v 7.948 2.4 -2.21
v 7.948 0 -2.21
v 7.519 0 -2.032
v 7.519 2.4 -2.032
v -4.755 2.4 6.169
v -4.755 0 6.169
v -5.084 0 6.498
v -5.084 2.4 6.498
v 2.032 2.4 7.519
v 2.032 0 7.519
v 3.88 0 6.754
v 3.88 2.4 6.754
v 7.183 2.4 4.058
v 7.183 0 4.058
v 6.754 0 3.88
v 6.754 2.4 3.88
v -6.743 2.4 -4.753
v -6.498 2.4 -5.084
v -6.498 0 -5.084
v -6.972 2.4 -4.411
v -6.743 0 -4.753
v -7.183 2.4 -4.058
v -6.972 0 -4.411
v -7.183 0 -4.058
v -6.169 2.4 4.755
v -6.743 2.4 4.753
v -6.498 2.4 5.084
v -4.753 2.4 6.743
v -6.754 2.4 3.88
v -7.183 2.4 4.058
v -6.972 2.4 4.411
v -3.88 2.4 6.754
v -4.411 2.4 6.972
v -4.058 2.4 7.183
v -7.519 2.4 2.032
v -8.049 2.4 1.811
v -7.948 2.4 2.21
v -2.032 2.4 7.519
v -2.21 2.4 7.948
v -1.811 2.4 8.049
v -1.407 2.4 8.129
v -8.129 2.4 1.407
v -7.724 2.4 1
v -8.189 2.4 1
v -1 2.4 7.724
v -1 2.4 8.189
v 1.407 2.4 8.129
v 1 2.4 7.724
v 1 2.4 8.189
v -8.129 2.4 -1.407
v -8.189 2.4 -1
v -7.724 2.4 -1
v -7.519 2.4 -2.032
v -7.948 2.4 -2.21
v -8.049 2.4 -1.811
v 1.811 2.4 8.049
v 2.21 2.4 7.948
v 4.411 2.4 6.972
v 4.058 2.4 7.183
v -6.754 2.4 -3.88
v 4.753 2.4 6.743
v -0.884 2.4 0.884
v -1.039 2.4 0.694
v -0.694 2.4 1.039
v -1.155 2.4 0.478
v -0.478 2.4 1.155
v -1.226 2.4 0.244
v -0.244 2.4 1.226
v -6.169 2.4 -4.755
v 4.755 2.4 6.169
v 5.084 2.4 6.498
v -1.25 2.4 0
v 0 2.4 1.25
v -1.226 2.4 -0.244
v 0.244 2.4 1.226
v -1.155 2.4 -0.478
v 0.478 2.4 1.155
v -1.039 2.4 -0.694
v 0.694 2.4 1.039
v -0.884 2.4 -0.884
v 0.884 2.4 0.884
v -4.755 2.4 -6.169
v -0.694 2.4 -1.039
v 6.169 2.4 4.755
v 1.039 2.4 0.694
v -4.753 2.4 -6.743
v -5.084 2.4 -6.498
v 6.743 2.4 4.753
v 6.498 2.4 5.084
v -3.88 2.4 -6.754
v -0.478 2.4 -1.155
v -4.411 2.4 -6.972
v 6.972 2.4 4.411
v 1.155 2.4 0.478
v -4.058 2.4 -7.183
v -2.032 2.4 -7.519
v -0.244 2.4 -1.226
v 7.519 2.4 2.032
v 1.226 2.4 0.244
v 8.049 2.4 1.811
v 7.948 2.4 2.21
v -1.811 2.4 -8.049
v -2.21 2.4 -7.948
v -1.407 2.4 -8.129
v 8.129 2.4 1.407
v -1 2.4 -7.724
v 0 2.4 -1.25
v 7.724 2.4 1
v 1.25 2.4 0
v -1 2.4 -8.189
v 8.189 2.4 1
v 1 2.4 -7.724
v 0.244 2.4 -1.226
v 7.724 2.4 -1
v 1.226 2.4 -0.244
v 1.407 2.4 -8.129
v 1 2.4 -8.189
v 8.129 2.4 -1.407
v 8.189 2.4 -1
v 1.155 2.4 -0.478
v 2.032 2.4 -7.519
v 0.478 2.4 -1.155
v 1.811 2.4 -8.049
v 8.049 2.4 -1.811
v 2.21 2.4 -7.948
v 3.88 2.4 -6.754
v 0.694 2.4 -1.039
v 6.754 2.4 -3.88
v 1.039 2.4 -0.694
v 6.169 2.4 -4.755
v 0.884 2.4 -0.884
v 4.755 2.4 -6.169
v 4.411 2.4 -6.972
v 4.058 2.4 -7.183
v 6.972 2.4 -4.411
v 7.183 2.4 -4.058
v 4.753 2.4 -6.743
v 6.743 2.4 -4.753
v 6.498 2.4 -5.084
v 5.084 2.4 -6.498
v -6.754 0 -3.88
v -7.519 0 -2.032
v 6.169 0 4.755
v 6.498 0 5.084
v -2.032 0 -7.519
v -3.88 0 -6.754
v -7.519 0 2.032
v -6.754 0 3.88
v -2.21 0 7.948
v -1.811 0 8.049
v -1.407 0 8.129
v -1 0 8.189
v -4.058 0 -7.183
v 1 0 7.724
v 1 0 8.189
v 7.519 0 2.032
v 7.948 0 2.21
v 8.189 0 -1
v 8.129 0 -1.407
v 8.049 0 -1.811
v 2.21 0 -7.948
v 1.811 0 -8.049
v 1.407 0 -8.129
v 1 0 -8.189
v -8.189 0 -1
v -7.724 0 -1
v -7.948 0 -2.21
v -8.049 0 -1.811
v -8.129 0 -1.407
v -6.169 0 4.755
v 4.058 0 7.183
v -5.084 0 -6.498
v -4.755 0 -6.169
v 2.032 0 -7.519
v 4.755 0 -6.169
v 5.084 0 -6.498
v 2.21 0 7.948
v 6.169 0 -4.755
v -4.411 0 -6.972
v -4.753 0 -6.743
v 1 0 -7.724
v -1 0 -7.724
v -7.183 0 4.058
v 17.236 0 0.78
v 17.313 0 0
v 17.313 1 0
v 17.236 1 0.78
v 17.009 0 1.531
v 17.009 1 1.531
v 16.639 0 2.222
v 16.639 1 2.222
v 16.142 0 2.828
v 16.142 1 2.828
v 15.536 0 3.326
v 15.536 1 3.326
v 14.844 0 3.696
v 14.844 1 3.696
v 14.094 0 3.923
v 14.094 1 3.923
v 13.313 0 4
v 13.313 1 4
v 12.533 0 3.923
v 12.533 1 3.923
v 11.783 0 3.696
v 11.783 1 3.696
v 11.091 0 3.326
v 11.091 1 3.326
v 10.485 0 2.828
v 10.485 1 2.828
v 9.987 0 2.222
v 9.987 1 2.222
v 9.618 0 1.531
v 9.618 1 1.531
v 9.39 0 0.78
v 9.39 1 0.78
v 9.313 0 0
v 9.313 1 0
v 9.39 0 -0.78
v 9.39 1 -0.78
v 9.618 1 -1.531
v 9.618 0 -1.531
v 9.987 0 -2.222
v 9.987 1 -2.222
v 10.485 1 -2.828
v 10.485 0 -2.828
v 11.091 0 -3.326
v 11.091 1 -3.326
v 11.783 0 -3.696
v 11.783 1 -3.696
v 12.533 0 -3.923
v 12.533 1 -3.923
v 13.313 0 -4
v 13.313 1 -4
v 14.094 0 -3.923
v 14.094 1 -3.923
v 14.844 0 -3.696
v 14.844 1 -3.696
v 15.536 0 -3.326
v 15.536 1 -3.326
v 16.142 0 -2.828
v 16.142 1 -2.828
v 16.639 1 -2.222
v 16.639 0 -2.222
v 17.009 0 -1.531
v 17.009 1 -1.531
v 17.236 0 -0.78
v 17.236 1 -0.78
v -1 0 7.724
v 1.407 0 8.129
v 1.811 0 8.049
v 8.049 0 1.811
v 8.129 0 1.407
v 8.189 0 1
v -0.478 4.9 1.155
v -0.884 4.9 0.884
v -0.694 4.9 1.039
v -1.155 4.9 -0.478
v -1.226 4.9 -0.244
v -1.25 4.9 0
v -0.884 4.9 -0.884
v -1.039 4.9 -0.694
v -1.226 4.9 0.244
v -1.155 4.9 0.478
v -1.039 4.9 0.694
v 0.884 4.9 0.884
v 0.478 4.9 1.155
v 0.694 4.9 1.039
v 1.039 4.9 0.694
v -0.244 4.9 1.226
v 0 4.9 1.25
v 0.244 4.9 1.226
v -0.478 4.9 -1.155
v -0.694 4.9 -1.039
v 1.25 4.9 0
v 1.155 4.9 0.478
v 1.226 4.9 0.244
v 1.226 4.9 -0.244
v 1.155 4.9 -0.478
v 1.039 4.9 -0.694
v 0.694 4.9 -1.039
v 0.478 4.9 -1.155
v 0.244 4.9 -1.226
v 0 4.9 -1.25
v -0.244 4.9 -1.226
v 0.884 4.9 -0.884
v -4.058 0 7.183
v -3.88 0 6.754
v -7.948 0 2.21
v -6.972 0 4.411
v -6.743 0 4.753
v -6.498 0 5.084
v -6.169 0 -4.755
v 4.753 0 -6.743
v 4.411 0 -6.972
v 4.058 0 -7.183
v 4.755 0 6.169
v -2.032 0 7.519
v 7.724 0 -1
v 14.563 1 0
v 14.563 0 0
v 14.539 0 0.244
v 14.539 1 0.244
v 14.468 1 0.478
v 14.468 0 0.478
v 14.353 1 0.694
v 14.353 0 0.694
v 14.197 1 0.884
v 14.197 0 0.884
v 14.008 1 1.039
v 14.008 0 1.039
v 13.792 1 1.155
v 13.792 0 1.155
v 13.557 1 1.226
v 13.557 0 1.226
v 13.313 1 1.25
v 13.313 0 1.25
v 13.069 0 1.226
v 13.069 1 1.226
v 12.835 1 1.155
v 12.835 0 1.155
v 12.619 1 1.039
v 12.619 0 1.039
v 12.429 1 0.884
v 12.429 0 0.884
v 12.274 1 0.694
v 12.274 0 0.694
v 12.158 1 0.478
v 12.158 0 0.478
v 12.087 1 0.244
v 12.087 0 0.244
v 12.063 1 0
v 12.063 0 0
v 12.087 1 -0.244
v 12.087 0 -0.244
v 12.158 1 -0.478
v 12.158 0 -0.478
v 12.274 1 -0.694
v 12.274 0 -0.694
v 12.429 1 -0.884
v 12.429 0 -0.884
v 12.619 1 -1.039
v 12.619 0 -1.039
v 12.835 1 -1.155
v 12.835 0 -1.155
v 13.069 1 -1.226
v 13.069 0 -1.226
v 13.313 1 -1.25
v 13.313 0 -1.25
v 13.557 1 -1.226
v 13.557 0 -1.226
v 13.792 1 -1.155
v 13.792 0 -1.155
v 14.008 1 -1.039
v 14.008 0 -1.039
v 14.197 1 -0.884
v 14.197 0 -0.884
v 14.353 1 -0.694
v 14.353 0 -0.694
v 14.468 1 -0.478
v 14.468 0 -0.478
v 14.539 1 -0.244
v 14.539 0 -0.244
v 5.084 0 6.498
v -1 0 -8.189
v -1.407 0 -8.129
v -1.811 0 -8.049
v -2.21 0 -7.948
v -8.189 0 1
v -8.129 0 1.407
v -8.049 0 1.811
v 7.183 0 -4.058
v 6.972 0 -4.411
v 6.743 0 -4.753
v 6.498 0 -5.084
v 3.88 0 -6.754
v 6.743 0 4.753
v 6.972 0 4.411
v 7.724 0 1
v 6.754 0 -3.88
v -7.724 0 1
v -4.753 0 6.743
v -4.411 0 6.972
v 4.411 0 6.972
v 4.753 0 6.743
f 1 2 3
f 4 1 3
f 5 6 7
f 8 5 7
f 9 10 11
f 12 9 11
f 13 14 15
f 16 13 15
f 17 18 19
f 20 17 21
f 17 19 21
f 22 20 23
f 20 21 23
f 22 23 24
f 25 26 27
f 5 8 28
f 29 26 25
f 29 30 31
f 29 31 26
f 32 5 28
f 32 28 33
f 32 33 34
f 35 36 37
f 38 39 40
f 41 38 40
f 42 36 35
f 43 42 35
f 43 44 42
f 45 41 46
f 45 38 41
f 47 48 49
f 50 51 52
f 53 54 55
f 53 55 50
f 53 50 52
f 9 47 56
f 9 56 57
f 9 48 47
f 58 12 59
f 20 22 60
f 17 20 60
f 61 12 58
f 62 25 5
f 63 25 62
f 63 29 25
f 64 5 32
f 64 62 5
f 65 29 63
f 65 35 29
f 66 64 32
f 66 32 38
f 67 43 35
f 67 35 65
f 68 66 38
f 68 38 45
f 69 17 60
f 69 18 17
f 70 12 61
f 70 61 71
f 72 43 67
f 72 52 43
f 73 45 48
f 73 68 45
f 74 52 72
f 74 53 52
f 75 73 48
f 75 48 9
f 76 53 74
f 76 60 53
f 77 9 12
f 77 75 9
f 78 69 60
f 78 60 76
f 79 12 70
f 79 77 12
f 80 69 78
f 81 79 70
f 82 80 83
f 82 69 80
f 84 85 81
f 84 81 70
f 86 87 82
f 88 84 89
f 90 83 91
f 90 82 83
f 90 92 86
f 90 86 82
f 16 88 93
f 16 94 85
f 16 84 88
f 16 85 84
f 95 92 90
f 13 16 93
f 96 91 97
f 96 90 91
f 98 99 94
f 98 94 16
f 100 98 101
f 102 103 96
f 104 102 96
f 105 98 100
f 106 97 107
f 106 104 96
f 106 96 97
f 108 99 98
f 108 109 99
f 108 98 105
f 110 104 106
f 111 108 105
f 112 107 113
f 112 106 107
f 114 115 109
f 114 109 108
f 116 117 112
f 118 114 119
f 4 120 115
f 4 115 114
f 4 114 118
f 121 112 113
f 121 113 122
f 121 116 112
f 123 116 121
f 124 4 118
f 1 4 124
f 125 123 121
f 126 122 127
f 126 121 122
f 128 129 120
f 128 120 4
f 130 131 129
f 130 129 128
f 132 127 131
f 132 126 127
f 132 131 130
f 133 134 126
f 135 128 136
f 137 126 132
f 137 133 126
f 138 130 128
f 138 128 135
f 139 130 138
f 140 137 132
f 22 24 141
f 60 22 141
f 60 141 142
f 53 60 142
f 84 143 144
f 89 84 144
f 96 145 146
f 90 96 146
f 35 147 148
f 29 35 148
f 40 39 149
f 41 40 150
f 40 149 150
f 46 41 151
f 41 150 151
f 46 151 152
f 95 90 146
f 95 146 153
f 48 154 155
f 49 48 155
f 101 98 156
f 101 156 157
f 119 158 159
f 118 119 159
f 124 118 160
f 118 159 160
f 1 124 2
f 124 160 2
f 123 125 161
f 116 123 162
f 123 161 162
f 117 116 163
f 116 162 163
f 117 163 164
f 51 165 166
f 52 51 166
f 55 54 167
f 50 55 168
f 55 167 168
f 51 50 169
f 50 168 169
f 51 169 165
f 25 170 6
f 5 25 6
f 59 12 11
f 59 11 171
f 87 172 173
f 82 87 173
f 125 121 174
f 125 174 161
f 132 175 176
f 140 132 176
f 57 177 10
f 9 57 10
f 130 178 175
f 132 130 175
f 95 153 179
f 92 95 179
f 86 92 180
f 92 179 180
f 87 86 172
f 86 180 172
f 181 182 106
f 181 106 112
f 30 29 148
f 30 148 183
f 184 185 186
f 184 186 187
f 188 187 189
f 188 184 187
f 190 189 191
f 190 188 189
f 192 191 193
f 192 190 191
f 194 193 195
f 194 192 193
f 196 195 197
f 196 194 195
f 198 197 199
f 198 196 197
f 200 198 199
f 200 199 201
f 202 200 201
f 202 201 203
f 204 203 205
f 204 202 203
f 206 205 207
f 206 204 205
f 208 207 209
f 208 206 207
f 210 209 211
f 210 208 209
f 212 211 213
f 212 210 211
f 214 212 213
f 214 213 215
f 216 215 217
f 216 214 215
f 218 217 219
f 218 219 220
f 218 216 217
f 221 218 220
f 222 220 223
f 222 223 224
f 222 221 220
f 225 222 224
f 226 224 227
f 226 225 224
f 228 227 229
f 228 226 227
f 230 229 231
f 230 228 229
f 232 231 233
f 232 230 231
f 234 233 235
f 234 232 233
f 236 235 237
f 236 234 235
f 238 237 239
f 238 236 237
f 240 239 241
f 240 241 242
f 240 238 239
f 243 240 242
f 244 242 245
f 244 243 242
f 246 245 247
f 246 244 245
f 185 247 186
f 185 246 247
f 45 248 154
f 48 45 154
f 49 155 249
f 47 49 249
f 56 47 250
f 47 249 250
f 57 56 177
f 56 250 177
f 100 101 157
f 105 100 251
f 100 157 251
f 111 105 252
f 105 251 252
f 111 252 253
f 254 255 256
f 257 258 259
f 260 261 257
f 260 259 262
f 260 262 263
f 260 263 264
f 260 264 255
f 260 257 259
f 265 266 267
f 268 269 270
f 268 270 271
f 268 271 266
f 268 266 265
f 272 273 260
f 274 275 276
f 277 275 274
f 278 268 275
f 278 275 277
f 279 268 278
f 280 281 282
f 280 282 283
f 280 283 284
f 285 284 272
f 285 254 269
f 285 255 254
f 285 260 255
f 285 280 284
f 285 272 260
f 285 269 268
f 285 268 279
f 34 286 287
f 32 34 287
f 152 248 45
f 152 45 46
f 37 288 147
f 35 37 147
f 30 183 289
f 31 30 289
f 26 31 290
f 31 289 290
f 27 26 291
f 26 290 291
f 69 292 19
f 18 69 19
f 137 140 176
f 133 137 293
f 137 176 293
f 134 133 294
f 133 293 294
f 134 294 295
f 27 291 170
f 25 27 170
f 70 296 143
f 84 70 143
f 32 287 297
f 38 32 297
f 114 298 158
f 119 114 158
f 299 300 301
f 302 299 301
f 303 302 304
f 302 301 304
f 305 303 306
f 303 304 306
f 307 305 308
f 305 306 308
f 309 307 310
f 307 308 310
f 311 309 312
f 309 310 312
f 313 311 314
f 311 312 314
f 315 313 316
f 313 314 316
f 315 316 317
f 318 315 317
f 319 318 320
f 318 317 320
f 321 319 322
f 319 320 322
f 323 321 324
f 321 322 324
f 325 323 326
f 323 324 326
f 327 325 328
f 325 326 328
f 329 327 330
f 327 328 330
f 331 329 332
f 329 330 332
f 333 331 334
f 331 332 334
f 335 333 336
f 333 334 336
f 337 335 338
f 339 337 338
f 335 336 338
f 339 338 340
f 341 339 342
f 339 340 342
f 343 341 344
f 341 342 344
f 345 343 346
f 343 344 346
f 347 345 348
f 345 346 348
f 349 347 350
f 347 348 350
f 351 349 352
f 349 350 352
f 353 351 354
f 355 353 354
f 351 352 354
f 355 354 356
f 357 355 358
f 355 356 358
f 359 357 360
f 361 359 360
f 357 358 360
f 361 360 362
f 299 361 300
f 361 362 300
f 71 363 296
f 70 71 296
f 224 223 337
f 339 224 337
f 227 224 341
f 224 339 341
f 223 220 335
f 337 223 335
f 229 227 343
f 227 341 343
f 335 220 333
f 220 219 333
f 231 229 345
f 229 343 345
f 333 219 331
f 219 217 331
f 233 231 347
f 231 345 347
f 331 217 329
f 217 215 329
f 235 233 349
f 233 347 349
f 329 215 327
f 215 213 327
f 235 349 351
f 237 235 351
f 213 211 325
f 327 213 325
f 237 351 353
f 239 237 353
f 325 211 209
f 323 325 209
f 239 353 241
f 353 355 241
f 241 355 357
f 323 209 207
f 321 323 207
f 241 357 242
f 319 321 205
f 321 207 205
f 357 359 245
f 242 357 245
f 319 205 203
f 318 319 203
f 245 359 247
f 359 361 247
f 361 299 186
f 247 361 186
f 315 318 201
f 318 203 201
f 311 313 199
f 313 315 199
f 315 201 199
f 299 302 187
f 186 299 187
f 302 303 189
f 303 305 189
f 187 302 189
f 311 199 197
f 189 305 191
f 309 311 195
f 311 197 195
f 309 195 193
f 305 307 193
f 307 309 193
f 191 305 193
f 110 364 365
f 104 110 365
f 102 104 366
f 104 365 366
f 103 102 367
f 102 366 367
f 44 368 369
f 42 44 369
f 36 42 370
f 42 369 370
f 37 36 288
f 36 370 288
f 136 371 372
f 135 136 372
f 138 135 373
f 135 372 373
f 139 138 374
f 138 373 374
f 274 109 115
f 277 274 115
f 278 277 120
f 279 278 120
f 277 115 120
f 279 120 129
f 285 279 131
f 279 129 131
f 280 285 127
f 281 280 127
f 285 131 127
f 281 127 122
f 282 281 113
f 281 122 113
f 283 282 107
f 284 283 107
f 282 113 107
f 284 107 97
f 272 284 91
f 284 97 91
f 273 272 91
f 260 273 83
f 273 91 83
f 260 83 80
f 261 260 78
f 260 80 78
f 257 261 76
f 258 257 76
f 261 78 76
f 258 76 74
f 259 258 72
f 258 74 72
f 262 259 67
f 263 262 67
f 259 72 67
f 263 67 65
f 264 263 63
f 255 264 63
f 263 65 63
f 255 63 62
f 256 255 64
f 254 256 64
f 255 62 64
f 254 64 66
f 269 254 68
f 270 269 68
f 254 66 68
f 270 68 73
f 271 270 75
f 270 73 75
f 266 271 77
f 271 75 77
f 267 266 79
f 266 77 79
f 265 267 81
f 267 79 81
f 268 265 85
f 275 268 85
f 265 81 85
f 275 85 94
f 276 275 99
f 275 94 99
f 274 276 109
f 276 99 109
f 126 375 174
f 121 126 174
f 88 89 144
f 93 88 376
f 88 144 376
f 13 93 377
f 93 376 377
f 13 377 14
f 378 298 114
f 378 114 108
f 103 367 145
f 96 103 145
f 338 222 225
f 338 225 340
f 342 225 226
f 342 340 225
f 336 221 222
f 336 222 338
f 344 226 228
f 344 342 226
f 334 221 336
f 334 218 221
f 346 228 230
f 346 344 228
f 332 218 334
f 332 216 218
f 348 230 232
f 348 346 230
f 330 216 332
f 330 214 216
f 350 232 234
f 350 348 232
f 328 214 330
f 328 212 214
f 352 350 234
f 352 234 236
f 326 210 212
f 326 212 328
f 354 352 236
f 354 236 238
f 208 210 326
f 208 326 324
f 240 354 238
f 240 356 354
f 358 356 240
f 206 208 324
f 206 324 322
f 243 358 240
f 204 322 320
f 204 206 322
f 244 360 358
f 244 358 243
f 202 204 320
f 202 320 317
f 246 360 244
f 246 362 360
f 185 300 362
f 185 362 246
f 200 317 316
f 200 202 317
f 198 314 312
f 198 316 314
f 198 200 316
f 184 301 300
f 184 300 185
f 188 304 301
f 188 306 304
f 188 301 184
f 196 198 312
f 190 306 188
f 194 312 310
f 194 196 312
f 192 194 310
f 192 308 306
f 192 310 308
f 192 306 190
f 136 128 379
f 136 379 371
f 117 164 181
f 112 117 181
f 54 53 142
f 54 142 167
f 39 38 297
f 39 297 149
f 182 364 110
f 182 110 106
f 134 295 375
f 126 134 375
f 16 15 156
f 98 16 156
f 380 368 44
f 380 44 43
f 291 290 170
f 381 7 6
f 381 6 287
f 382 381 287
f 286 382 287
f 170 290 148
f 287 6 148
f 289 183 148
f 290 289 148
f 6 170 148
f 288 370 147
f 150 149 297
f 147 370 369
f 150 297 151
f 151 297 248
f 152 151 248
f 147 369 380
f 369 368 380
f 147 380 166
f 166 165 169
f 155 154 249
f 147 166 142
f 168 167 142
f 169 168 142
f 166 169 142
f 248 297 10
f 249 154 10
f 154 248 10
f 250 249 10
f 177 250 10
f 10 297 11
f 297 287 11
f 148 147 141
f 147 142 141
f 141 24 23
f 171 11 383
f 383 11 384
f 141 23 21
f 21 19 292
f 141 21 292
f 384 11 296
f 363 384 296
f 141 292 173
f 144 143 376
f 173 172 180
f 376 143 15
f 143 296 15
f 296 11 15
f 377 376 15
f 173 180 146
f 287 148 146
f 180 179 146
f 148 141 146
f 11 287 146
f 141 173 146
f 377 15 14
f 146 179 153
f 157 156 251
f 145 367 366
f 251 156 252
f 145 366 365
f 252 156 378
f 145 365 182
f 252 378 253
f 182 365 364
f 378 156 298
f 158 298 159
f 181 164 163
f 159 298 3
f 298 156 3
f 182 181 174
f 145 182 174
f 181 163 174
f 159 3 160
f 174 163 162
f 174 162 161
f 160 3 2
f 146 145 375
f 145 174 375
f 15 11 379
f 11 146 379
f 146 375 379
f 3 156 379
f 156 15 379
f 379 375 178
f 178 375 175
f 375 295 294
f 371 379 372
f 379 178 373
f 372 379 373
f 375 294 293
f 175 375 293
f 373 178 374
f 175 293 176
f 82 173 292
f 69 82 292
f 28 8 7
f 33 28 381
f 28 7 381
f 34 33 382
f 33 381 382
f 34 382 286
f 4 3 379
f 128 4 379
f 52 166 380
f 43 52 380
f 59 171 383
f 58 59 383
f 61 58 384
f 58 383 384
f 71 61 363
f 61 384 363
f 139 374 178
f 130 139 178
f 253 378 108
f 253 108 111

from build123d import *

# Parameters (mm, degrees)
SKETCH1_R           = 8.25
BOSS_EXTRUDE1_DEPTH = 2.4
SKETCH2_R           = 1.25
BOSS_EXTRUDE2_DEPTH = 2.5
SKETCH4_W           = 2
SKETCH4_H           = 1.552029397
SKETCH4_W_2         = 1.552029397
SKETCH4_H_2         = 2
CUT_EXTRUDE2_DEPTH  = 4
SKETCH5_R           = 4
SKETCH5_R_2         = 1.25
BOSS_EXTRUDE3_DEPTH = 1


with BuildPart() as part:
    # Sketch1 → Boss-Extrude1 (new body)
    with BuildSketch(Plane(origin=(0, 0, 0), x_dir=(1, 0, 0), z_dir=(0, 1, 0))):
        Circle(SKETCH1_R)
    extrude(amount=BOSS_EXTRUDE1_DEPTH)

    # Sketch2 → Boss-Extrude2 (add)
    with BuildSketch(Plane(origin=(0, 2.4, 0), x_dir=(1, 0, 0), z_dir=(0, 1, 0))):
        Circle(SKETCH2_R)
    extrude(amount=BOSS_EXTRUDE2_DEPTH)

    # Sketch4 → Cut-Extrude2 (cut)
    with BuildSketch(Plane.XZ):
        Polygon((2.625964421, 8.952764849), (2.032028484, 7.518876655), (3.879787549, 6.75350979), (4.473723486, 8.187397984), align=None)
        with Locations((0, 8.500174583)):
            Rectangle(SKETCH4_W, SKETCH4_H)
        Polygon((5.852149563, 7.266363125), (4.754699052, 6.168912614), (6.168912614, 4.754699052), (7.266363125, 5.852149563), align=None)
        Polygon((8.187397984, 4.473723486), (6.75350979, 3.879787549), (7.518876655, 2.032028484), (8.952764849, 2.625964421), align=None)
        with Locations((8.500174583, 0)):
            Rectangle(SKETCH4_W_2, SKETCH4_H_2)
        Polygon((8.952764849, -2.625964421), (7.518876655, -2.032028484), (6.75350979, -3.879787549), (8.187397984, -4.473723486), align=None)
        Polygon((7.266363125, -5.852149563), (6.168912614, -4.754699052), (4.754699052, -6.168912614), (5.852149563, -7.266363125), align=None)
        Polygon((4.473723486, -8.187397984), (3.879787549, -6.75350979), (2.032028484, -7.518876655), (2.625964421, -8.952764849), align=None)
        with Locations((0, -8.500174583)):
            Rectangle(SKETCH4_W, SKETCH4_H)
        Polygon((-2.625964421, -8.952764849), (-2.032028484, -7.518876655), (-3.879787549, -6.75350979), (-4.473723486, -8.187397984), align=None)
        Polygon((-5.852149563, -7.266363125), (-4.754699052, -6.168912614), (-6.168912614, -4.754699052), (-7.266363125, -5.852149563), align=None)
        Polygon((-8.187397984, -4.473723486), (-6.75350979, -3.879787549), (-7.518876655, -2.032028484), (-8.952764849, -2.625964421), align=None)
        with Locations((-8.500174583, 0)):
            Rectangle(SKETCH4_W_2, SKETCH4_H_2)
        Polygon((-8.952764849, 2.625964421), (-7.518876655, 2.032028484), (-6.75350979, 3.879787549), (-8.187397984, 4.473723486), align=None)
        Polygon((-7.266363125, 5.852149563), (-6.168912614, 4.754699052), (-4.754699052, 6.168912614), (-5.852149563, 7.266363125), align=None)
        Polygon((-4.473723486, 8.187397984), (-3.879787549, 6.75350979), (-2.032028484, 7.518876655), (-2.625964421, 8.952764849), align=None)
    extrude(amount=-CUT_EXTRUDE2_DEPTH, mode=Mode.SUBTRACT)


with BuildPart() as body_2:
    # Sketch5 → Boss-Extrude3 (new body)
    with BuildSketch(Plane.XZ):
        with Locations((13.313340445, 0)):
            Circle(SKETCH5_R)
        with Locations((13.313340445, 0)):
            Circle(SKETCH5_R_2, mode=Mode.SUBTRACT)
    extrude(amount=-BOSS_EXTRUDE3_DEPTH)


solid = Compound([part.part, body_2.part])
